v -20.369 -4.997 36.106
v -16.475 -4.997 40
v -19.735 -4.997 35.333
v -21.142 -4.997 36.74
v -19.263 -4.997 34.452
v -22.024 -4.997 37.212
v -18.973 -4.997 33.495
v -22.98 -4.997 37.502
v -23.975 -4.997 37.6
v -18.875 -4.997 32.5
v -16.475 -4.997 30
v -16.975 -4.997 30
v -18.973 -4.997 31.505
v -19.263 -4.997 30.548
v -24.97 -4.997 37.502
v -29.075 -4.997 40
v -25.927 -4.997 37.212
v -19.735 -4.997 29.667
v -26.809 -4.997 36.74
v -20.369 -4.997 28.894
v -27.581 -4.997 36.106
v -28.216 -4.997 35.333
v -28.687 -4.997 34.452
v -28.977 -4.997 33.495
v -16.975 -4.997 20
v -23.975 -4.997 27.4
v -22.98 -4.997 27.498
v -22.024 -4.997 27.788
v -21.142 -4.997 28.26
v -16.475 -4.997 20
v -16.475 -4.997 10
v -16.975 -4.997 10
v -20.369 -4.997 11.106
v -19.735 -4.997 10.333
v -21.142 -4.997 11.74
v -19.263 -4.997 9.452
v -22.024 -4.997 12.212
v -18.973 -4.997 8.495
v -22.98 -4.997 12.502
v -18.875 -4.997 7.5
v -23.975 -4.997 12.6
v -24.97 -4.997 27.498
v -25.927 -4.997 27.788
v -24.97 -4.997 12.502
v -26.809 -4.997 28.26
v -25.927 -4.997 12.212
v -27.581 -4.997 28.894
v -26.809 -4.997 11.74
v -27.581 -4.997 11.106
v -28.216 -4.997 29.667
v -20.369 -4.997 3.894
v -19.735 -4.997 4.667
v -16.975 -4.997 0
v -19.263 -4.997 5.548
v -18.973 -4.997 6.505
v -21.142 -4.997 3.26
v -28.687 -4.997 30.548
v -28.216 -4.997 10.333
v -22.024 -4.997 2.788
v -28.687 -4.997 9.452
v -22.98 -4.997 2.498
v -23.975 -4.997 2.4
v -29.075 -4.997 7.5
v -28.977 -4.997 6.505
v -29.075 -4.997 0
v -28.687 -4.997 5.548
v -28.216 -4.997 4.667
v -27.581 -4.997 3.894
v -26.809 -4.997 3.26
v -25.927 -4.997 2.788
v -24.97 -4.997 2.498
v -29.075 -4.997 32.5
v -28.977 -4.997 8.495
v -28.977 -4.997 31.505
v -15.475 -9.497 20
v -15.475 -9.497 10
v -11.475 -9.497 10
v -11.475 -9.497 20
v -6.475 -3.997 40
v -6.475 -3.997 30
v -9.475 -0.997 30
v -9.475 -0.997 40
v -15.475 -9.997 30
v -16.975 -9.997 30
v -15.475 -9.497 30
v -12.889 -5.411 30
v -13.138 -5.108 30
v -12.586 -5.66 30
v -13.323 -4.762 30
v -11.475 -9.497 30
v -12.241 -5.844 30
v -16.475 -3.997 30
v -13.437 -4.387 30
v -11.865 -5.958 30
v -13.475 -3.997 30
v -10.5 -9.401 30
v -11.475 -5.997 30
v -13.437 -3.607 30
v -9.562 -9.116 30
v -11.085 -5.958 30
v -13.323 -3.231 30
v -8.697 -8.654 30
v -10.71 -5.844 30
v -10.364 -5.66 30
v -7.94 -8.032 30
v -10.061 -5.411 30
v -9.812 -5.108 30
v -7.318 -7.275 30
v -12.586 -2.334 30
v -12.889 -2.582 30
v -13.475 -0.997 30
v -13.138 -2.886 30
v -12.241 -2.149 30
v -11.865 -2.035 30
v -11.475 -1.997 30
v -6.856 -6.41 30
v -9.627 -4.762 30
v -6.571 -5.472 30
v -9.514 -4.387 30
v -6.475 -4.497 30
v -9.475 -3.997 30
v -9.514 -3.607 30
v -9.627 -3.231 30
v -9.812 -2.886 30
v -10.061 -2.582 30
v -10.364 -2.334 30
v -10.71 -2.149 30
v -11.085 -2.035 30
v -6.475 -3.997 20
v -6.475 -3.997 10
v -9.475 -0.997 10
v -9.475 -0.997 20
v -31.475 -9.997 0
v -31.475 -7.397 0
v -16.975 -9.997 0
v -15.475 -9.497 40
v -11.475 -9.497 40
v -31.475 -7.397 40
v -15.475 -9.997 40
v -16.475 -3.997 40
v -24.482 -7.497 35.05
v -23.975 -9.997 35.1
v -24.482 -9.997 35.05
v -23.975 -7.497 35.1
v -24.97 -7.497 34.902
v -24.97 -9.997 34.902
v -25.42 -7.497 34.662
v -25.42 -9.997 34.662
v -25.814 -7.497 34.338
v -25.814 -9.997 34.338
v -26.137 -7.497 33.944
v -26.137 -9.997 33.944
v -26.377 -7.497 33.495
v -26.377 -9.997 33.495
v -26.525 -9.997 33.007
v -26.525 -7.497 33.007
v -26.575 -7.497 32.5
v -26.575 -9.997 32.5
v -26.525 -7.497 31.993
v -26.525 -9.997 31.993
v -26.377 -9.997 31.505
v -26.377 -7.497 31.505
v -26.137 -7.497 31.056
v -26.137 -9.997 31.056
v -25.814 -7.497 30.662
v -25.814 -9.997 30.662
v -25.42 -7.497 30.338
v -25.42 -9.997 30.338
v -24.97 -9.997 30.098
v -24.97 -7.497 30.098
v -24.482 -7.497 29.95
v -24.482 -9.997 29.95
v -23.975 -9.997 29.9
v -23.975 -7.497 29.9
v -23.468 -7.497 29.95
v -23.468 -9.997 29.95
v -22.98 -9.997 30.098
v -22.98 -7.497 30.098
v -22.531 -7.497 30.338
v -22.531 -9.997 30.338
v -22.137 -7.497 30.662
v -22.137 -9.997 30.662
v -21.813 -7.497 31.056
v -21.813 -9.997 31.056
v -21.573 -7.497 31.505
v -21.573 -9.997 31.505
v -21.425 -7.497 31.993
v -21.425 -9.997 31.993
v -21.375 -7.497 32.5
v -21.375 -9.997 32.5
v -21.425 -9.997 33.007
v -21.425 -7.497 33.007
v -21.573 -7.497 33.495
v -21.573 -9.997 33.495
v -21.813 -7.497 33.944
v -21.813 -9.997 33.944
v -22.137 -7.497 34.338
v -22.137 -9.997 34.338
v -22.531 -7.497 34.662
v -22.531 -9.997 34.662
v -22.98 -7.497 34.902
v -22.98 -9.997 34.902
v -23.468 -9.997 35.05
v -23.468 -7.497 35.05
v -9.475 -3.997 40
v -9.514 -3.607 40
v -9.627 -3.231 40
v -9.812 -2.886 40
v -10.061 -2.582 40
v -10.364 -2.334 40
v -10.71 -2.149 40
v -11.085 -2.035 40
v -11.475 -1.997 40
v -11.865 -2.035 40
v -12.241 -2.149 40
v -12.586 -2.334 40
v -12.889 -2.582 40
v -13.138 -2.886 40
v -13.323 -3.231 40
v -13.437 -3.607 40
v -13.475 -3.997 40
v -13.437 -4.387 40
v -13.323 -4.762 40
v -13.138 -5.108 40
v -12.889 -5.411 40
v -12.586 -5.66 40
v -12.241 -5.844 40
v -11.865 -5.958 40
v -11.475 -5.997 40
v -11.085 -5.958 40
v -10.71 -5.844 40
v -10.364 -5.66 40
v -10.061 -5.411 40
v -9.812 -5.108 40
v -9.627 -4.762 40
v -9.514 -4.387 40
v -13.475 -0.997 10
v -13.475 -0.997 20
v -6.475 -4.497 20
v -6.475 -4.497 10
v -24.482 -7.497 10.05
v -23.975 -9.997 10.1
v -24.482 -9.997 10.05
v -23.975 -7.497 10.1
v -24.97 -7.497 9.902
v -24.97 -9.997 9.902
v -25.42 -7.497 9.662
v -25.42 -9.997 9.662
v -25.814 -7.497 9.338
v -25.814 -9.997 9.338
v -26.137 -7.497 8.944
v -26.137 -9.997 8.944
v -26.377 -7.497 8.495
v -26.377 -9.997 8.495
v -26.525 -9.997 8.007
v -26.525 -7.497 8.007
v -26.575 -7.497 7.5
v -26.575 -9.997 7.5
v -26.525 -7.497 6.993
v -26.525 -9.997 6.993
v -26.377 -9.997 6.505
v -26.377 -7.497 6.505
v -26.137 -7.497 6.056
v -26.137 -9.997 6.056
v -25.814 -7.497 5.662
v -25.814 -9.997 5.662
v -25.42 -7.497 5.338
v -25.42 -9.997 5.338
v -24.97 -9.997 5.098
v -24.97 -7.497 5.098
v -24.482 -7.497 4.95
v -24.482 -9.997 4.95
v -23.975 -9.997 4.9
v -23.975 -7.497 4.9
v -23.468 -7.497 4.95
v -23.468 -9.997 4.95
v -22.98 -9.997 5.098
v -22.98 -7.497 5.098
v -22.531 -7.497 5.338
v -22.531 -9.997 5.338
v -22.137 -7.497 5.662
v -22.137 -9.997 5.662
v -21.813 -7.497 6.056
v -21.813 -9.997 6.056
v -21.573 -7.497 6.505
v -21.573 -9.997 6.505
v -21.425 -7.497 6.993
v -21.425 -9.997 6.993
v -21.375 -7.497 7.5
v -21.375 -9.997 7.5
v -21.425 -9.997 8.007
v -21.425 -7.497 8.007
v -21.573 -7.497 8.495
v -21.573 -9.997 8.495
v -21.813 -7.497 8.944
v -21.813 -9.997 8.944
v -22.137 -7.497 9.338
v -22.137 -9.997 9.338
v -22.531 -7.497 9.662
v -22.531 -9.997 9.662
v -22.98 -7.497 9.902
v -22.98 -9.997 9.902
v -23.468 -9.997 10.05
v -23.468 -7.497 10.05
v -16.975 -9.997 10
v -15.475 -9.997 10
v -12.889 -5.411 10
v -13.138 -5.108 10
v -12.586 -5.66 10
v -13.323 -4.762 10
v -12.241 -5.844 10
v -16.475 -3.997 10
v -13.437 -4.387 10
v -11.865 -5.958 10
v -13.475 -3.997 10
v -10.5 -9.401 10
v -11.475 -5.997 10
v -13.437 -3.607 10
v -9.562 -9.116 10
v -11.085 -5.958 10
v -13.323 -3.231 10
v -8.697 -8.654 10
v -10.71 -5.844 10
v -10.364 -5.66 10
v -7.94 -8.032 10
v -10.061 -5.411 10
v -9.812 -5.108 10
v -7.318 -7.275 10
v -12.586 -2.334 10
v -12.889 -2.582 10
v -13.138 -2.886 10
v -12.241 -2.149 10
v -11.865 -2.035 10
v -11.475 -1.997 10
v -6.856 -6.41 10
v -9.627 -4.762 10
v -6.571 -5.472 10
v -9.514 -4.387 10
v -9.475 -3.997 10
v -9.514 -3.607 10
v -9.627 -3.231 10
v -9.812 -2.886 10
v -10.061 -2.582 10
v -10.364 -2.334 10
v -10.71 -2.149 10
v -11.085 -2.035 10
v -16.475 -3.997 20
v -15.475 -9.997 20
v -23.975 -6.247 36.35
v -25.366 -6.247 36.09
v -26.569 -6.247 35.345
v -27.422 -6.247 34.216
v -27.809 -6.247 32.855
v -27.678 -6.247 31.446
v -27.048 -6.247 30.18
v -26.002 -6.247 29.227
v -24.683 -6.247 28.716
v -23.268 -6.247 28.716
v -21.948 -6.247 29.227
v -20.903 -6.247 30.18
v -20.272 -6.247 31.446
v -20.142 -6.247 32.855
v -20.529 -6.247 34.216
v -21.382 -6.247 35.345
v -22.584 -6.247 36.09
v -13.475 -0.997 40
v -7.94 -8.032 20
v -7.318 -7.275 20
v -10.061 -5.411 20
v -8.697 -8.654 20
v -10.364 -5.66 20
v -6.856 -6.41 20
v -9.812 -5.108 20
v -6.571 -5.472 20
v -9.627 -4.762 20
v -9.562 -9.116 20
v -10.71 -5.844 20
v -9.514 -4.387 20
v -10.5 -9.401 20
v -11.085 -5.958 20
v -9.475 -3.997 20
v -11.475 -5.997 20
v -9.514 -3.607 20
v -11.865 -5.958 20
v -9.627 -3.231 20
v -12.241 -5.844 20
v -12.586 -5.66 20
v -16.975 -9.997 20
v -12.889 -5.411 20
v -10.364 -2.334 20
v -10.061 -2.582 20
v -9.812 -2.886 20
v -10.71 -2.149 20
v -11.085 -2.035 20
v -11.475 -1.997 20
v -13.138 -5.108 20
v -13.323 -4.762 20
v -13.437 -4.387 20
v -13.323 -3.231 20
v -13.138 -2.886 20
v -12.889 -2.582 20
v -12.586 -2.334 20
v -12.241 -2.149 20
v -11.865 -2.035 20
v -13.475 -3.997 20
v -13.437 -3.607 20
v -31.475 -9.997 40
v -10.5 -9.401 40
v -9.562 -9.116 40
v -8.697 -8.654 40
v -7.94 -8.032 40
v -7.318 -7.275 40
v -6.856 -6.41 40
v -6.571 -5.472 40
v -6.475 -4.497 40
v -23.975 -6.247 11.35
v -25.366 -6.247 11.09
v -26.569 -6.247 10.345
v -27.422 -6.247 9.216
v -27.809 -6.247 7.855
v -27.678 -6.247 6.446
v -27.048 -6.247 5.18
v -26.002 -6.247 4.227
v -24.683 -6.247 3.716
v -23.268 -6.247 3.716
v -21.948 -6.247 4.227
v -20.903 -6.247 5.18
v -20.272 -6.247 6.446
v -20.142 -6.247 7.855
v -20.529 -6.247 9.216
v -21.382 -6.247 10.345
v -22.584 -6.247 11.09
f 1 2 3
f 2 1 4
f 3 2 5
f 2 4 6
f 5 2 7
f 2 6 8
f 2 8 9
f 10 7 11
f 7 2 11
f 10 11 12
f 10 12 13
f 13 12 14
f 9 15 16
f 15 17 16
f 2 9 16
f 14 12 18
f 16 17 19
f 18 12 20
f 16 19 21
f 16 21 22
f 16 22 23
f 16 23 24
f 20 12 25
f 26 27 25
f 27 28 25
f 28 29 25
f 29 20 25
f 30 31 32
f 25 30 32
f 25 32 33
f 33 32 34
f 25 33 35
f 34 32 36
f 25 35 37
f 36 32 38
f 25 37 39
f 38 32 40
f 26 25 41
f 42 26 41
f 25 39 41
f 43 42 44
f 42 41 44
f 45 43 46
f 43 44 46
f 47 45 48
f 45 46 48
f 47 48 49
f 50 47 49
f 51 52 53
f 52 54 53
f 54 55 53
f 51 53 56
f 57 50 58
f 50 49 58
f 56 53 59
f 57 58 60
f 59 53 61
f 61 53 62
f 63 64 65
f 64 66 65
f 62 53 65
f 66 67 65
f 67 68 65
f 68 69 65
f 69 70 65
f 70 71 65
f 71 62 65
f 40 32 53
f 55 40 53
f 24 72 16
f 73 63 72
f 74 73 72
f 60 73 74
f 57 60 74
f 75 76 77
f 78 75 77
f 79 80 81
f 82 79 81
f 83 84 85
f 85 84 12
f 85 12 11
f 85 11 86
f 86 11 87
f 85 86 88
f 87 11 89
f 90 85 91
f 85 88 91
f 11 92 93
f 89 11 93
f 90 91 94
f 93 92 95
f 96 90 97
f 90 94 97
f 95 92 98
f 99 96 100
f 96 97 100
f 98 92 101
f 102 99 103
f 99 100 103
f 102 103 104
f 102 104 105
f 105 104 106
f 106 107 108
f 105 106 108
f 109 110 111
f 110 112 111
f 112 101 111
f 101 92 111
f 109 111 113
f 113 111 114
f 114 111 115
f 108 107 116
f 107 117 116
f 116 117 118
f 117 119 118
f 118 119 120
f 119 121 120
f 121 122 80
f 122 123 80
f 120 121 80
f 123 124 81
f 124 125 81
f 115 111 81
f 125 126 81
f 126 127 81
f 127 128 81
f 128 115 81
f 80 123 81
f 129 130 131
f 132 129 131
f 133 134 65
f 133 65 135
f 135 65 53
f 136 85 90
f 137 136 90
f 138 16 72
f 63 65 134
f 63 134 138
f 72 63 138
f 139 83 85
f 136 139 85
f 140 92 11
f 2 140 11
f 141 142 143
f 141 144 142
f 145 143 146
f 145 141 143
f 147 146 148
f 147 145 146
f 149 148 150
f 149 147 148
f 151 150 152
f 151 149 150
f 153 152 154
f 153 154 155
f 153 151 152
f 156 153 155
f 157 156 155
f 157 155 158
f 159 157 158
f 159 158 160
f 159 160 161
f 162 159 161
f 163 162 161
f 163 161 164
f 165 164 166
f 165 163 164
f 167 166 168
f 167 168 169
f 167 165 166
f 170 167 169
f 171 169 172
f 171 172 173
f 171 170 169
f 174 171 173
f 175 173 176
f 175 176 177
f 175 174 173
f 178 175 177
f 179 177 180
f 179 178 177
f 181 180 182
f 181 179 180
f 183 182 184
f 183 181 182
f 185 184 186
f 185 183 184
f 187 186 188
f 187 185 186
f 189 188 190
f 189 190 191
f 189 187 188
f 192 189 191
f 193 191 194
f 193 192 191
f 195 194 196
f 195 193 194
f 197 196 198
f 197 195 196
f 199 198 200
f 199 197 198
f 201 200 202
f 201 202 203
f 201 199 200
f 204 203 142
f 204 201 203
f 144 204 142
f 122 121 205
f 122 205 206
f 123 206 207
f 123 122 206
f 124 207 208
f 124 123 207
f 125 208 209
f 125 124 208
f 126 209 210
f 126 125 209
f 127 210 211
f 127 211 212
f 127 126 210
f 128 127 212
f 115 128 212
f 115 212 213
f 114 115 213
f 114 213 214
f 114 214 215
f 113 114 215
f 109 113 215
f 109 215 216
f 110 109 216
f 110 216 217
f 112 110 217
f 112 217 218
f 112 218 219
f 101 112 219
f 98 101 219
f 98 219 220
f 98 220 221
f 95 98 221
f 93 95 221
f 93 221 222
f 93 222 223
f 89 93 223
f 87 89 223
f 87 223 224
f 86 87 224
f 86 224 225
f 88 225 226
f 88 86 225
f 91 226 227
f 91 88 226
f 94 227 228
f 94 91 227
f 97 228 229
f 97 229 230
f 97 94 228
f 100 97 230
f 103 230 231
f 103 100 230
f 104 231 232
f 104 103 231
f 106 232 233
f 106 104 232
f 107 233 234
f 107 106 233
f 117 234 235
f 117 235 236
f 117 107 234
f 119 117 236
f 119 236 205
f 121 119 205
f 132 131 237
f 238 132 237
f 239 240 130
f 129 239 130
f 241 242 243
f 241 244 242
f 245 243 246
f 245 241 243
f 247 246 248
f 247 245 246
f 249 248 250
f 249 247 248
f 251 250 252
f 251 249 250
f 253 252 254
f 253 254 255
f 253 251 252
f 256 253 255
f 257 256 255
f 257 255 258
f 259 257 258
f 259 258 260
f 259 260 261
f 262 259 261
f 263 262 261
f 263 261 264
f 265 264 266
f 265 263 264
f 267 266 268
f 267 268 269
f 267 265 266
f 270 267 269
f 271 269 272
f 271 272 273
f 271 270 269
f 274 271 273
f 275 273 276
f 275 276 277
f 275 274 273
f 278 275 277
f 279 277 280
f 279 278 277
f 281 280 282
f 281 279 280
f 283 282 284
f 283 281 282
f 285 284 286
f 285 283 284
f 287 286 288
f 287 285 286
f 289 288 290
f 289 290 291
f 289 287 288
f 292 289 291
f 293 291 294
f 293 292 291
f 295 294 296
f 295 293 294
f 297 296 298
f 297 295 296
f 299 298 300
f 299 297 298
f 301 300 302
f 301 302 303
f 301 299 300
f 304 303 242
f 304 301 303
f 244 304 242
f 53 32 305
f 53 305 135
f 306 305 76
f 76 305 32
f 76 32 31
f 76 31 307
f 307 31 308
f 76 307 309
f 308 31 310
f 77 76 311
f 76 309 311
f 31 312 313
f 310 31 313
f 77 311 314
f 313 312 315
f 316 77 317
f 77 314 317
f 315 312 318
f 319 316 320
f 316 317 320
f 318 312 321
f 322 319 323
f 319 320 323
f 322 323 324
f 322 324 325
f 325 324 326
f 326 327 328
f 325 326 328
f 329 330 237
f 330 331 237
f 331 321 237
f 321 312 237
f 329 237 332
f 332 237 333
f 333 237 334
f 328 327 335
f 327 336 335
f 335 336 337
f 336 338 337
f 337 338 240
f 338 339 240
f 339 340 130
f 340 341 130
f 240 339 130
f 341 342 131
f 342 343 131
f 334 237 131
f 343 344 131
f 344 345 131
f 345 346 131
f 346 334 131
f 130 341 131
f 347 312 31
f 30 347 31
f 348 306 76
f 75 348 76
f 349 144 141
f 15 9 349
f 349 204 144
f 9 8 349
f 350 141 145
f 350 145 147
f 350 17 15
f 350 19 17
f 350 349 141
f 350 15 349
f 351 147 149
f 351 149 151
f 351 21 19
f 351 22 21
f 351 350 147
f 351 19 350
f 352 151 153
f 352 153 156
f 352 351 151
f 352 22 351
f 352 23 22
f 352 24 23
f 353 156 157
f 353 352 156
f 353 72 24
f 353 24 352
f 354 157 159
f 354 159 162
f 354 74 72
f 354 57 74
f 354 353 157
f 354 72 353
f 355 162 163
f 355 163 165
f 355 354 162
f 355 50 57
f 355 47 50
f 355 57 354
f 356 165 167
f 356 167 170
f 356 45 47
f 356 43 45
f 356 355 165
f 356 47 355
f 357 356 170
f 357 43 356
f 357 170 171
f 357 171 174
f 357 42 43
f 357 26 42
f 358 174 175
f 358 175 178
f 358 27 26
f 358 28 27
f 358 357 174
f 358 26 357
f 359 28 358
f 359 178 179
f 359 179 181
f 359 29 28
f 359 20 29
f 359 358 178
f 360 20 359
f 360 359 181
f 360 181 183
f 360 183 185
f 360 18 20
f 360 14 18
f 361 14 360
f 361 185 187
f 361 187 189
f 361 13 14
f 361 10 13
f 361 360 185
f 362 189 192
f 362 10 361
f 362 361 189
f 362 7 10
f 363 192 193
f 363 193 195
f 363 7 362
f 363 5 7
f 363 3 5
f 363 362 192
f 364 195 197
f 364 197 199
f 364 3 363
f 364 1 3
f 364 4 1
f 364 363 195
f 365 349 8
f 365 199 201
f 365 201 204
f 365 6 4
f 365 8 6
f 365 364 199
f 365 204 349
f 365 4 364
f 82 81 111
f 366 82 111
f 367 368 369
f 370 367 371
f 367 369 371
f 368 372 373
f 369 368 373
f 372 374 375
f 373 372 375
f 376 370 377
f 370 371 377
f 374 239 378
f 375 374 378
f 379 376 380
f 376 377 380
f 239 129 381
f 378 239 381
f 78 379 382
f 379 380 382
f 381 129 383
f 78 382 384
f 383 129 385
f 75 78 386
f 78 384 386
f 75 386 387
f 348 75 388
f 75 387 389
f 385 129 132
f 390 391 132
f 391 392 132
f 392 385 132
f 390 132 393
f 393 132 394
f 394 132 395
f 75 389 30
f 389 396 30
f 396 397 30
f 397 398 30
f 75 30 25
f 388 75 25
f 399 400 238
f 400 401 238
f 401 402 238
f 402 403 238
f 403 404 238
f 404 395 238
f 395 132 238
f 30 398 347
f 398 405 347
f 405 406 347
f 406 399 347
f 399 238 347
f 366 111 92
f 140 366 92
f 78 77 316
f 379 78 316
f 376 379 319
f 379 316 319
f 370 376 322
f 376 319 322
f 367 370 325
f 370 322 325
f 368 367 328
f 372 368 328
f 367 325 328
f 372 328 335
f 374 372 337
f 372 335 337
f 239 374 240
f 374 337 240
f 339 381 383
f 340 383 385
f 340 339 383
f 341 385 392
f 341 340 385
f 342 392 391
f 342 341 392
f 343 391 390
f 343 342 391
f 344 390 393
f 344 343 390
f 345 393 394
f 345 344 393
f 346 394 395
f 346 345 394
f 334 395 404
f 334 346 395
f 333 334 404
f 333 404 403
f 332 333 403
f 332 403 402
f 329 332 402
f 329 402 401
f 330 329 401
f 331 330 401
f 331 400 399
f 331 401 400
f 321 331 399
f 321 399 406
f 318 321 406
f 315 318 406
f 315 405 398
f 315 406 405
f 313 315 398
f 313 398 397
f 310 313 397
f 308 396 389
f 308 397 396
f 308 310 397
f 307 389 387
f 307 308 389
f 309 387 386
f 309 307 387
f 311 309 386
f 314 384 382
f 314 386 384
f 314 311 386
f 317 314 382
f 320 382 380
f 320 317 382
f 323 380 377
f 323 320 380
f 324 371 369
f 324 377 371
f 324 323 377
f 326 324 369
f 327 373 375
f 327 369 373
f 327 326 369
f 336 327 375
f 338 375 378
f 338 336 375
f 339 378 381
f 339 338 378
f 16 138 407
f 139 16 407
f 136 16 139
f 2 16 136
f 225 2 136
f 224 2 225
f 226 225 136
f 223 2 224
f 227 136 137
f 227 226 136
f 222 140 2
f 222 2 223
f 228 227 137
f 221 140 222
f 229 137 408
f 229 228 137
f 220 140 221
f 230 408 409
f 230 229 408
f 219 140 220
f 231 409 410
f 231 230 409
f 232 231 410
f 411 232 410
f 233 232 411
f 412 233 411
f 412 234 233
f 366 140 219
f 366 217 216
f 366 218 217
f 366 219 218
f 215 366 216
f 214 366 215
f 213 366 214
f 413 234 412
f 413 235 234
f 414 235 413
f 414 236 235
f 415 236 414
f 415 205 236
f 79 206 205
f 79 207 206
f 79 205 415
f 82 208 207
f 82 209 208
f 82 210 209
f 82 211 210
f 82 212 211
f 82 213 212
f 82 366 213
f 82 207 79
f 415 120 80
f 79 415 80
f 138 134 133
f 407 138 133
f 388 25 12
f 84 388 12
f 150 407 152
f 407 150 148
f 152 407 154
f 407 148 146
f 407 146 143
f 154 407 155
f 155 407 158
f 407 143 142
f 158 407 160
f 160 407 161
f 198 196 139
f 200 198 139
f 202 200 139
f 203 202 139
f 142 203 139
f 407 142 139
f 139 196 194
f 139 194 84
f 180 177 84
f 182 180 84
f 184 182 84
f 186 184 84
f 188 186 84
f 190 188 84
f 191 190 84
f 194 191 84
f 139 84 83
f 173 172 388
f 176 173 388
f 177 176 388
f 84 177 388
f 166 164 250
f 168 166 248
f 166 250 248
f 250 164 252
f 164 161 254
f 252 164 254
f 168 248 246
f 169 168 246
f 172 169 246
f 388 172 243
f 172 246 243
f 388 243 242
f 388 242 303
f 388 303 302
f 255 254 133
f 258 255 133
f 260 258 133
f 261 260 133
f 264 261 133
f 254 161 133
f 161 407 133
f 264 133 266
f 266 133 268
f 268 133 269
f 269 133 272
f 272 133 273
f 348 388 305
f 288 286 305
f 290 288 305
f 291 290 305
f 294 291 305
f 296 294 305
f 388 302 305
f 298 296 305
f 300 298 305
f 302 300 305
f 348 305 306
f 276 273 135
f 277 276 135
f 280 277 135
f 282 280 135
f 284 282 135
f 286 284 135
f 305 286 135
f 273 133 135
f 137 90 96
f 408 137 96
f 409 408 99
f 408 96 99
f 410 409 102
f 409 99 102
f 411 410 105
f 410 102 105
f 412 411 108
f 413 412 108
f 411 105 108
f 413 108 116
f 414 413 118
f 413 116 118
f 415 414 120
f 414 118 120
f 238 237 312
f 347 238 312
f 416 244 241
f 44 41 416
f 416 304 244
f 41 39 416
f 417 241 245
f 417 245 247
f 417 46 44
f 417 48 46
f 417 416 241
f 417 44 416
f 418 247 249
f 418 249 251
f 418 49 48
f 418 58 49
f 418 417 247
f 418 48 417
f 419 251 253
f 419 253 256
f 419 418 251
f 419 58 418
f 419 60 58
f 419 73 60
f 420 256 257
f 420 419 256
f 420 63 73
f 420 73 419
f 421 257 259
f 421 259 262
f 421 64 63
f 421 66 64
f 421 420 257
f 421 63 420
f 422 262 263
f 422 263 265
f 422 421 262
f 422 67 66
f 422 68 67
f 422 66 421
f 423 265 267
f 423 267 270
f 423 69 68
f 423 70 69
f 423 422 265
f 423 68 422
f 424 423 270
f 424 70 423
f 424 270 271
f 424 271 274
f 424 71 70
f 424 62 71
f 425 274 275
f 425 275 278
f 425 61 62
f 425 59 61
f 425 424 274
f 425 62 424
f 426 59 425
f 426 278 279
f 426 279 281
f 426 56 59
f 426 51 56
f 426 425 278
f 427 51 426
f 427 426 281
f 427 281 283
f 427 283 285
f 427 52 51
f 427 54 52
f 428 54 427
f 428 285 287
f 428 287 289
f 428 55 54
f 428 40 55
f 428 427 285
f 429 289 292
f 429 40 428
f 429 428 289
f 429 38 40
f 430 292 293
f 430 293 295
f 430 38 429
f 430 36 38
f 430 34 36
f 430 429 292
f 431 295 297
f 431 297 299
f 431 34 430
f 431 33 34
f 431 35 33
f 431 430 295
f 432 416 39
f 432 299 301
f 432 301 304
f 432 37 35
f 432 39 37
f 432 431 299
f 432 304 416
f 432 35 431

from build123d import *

# Parameters (mm, degrees)
SKETCH1_R               = 2
EXTRUDE1_DEPTH          = 40
CUT_EXTRUDE1_DEPTH      = 5
CUT_EXTRUDE1_DEPTH_BACK = 6
HOLE1_AT_2_COUNT        = 2
HOLE1_AT_2_PITCH        = 25


with BuildPart() as part:
    # Sketch1 → Extrude1 (new body)
    with BuildSketch(Plane.XY):
        with BuildLine():
            Line((-31.475233645, -9.996703011), (-15.475233645, -9.996703011))
            Line((-15.475233645, -9.996703011), (-15.475233645, -9.496703011))
            Line((-15.475233645, -9.496703011), (-11.475233645, -9.496703011))
            ThreePointArc((-11.475233645, -9.496703011), (-7.939699739, -8.032236917), (-6.475233645, -4.496703011))
            Line((-6.475233645, -4.496703011), (-6.475233645, -3.996703011))
            Line((-6.475233645, -3.996703011), (-9.475233645, -0.996703011))
            Line((-9.475233645, -0.996703011), (-13.475233645, -0.996703011))
            Line((-13.475233645, -0.996703011), (-16.475233645, -3.996703011))
            Line((-16.475233645, -3.996703011), (-16.475233645, -4.996703011))
            Line((-16.475233645, -4.996703011), (-29.075233645, -4.996703011))
            Line((-29.075233645, -4.996703011), (-31.475233645, -7.396703011))
            Line((-31.475233645, -7.396703011), (-31.475233645, -9.996703011))
        make_face()
        with Locations((-11.475233645, -3.996703011)):
            Circle(SKETCH1_R, mode=Mode.SUBTRACT)
    extrude(amount=EXTRUDE1_DEPTH)

    # Sketch2 → Cut-Extrude1 (cut, two sides)
    with BuildSketch(Plane(origin=(0, -4.996703011, 0), x_dir=(1, 0, 0), z_dir=(0, 1, 0))) as cut_extrude1_sk:
        Polygon((-9.475233645, -20), (-16.975233645, -20), (-16.975233645, -28.700140492), (-16.975233645, -30), (-3.073130332, -30), (-3.073130332, -20), align=None)
        Polygon((-9.475233645, -10), (-16.975233645, -10), (-16.975233645, 0), (-9.475233645, 0), (-4.909711278, 0), (-4.909711278, -10), align=None)
    extrude(amount=CUT_EXTRUDE1_DEPTH, mode=Mode.SUBTRACT)
    extrude(cut_extrude1_sk.sketch, amount=-CUT_EXTRUDE1_DEPTH_BACK, mode=Mode.SUBTRACT)

    # Sketch4 → Hole1 (revolve, cut)
    with BuildSketch(Plane(origin=(-23.975233645, -4.996703011, 7.5), x_dir=(0, 0, 1), z_dir=(1, 0, 0))):
        Polygon((0, 0), (0, 5), (2.6, 5), (2.6, 2.5), (5.1, 0), align=None)
    hole1 = revolve(axis=Axis((-23.975233645, 1.353296989, 7.5), (0, -1, 0)), mode=Mode.SUBTRACT)

    # Hole1 at 2: Hole1 ×2
    with Locations(*[(0, 0, i * HOLE1_AT_2_PITCH) for i in range(1, HOLE1_AT_2_COUNT)]):
        add(hole1, mode=Mode.SUBTRACT)


solid = part.part
